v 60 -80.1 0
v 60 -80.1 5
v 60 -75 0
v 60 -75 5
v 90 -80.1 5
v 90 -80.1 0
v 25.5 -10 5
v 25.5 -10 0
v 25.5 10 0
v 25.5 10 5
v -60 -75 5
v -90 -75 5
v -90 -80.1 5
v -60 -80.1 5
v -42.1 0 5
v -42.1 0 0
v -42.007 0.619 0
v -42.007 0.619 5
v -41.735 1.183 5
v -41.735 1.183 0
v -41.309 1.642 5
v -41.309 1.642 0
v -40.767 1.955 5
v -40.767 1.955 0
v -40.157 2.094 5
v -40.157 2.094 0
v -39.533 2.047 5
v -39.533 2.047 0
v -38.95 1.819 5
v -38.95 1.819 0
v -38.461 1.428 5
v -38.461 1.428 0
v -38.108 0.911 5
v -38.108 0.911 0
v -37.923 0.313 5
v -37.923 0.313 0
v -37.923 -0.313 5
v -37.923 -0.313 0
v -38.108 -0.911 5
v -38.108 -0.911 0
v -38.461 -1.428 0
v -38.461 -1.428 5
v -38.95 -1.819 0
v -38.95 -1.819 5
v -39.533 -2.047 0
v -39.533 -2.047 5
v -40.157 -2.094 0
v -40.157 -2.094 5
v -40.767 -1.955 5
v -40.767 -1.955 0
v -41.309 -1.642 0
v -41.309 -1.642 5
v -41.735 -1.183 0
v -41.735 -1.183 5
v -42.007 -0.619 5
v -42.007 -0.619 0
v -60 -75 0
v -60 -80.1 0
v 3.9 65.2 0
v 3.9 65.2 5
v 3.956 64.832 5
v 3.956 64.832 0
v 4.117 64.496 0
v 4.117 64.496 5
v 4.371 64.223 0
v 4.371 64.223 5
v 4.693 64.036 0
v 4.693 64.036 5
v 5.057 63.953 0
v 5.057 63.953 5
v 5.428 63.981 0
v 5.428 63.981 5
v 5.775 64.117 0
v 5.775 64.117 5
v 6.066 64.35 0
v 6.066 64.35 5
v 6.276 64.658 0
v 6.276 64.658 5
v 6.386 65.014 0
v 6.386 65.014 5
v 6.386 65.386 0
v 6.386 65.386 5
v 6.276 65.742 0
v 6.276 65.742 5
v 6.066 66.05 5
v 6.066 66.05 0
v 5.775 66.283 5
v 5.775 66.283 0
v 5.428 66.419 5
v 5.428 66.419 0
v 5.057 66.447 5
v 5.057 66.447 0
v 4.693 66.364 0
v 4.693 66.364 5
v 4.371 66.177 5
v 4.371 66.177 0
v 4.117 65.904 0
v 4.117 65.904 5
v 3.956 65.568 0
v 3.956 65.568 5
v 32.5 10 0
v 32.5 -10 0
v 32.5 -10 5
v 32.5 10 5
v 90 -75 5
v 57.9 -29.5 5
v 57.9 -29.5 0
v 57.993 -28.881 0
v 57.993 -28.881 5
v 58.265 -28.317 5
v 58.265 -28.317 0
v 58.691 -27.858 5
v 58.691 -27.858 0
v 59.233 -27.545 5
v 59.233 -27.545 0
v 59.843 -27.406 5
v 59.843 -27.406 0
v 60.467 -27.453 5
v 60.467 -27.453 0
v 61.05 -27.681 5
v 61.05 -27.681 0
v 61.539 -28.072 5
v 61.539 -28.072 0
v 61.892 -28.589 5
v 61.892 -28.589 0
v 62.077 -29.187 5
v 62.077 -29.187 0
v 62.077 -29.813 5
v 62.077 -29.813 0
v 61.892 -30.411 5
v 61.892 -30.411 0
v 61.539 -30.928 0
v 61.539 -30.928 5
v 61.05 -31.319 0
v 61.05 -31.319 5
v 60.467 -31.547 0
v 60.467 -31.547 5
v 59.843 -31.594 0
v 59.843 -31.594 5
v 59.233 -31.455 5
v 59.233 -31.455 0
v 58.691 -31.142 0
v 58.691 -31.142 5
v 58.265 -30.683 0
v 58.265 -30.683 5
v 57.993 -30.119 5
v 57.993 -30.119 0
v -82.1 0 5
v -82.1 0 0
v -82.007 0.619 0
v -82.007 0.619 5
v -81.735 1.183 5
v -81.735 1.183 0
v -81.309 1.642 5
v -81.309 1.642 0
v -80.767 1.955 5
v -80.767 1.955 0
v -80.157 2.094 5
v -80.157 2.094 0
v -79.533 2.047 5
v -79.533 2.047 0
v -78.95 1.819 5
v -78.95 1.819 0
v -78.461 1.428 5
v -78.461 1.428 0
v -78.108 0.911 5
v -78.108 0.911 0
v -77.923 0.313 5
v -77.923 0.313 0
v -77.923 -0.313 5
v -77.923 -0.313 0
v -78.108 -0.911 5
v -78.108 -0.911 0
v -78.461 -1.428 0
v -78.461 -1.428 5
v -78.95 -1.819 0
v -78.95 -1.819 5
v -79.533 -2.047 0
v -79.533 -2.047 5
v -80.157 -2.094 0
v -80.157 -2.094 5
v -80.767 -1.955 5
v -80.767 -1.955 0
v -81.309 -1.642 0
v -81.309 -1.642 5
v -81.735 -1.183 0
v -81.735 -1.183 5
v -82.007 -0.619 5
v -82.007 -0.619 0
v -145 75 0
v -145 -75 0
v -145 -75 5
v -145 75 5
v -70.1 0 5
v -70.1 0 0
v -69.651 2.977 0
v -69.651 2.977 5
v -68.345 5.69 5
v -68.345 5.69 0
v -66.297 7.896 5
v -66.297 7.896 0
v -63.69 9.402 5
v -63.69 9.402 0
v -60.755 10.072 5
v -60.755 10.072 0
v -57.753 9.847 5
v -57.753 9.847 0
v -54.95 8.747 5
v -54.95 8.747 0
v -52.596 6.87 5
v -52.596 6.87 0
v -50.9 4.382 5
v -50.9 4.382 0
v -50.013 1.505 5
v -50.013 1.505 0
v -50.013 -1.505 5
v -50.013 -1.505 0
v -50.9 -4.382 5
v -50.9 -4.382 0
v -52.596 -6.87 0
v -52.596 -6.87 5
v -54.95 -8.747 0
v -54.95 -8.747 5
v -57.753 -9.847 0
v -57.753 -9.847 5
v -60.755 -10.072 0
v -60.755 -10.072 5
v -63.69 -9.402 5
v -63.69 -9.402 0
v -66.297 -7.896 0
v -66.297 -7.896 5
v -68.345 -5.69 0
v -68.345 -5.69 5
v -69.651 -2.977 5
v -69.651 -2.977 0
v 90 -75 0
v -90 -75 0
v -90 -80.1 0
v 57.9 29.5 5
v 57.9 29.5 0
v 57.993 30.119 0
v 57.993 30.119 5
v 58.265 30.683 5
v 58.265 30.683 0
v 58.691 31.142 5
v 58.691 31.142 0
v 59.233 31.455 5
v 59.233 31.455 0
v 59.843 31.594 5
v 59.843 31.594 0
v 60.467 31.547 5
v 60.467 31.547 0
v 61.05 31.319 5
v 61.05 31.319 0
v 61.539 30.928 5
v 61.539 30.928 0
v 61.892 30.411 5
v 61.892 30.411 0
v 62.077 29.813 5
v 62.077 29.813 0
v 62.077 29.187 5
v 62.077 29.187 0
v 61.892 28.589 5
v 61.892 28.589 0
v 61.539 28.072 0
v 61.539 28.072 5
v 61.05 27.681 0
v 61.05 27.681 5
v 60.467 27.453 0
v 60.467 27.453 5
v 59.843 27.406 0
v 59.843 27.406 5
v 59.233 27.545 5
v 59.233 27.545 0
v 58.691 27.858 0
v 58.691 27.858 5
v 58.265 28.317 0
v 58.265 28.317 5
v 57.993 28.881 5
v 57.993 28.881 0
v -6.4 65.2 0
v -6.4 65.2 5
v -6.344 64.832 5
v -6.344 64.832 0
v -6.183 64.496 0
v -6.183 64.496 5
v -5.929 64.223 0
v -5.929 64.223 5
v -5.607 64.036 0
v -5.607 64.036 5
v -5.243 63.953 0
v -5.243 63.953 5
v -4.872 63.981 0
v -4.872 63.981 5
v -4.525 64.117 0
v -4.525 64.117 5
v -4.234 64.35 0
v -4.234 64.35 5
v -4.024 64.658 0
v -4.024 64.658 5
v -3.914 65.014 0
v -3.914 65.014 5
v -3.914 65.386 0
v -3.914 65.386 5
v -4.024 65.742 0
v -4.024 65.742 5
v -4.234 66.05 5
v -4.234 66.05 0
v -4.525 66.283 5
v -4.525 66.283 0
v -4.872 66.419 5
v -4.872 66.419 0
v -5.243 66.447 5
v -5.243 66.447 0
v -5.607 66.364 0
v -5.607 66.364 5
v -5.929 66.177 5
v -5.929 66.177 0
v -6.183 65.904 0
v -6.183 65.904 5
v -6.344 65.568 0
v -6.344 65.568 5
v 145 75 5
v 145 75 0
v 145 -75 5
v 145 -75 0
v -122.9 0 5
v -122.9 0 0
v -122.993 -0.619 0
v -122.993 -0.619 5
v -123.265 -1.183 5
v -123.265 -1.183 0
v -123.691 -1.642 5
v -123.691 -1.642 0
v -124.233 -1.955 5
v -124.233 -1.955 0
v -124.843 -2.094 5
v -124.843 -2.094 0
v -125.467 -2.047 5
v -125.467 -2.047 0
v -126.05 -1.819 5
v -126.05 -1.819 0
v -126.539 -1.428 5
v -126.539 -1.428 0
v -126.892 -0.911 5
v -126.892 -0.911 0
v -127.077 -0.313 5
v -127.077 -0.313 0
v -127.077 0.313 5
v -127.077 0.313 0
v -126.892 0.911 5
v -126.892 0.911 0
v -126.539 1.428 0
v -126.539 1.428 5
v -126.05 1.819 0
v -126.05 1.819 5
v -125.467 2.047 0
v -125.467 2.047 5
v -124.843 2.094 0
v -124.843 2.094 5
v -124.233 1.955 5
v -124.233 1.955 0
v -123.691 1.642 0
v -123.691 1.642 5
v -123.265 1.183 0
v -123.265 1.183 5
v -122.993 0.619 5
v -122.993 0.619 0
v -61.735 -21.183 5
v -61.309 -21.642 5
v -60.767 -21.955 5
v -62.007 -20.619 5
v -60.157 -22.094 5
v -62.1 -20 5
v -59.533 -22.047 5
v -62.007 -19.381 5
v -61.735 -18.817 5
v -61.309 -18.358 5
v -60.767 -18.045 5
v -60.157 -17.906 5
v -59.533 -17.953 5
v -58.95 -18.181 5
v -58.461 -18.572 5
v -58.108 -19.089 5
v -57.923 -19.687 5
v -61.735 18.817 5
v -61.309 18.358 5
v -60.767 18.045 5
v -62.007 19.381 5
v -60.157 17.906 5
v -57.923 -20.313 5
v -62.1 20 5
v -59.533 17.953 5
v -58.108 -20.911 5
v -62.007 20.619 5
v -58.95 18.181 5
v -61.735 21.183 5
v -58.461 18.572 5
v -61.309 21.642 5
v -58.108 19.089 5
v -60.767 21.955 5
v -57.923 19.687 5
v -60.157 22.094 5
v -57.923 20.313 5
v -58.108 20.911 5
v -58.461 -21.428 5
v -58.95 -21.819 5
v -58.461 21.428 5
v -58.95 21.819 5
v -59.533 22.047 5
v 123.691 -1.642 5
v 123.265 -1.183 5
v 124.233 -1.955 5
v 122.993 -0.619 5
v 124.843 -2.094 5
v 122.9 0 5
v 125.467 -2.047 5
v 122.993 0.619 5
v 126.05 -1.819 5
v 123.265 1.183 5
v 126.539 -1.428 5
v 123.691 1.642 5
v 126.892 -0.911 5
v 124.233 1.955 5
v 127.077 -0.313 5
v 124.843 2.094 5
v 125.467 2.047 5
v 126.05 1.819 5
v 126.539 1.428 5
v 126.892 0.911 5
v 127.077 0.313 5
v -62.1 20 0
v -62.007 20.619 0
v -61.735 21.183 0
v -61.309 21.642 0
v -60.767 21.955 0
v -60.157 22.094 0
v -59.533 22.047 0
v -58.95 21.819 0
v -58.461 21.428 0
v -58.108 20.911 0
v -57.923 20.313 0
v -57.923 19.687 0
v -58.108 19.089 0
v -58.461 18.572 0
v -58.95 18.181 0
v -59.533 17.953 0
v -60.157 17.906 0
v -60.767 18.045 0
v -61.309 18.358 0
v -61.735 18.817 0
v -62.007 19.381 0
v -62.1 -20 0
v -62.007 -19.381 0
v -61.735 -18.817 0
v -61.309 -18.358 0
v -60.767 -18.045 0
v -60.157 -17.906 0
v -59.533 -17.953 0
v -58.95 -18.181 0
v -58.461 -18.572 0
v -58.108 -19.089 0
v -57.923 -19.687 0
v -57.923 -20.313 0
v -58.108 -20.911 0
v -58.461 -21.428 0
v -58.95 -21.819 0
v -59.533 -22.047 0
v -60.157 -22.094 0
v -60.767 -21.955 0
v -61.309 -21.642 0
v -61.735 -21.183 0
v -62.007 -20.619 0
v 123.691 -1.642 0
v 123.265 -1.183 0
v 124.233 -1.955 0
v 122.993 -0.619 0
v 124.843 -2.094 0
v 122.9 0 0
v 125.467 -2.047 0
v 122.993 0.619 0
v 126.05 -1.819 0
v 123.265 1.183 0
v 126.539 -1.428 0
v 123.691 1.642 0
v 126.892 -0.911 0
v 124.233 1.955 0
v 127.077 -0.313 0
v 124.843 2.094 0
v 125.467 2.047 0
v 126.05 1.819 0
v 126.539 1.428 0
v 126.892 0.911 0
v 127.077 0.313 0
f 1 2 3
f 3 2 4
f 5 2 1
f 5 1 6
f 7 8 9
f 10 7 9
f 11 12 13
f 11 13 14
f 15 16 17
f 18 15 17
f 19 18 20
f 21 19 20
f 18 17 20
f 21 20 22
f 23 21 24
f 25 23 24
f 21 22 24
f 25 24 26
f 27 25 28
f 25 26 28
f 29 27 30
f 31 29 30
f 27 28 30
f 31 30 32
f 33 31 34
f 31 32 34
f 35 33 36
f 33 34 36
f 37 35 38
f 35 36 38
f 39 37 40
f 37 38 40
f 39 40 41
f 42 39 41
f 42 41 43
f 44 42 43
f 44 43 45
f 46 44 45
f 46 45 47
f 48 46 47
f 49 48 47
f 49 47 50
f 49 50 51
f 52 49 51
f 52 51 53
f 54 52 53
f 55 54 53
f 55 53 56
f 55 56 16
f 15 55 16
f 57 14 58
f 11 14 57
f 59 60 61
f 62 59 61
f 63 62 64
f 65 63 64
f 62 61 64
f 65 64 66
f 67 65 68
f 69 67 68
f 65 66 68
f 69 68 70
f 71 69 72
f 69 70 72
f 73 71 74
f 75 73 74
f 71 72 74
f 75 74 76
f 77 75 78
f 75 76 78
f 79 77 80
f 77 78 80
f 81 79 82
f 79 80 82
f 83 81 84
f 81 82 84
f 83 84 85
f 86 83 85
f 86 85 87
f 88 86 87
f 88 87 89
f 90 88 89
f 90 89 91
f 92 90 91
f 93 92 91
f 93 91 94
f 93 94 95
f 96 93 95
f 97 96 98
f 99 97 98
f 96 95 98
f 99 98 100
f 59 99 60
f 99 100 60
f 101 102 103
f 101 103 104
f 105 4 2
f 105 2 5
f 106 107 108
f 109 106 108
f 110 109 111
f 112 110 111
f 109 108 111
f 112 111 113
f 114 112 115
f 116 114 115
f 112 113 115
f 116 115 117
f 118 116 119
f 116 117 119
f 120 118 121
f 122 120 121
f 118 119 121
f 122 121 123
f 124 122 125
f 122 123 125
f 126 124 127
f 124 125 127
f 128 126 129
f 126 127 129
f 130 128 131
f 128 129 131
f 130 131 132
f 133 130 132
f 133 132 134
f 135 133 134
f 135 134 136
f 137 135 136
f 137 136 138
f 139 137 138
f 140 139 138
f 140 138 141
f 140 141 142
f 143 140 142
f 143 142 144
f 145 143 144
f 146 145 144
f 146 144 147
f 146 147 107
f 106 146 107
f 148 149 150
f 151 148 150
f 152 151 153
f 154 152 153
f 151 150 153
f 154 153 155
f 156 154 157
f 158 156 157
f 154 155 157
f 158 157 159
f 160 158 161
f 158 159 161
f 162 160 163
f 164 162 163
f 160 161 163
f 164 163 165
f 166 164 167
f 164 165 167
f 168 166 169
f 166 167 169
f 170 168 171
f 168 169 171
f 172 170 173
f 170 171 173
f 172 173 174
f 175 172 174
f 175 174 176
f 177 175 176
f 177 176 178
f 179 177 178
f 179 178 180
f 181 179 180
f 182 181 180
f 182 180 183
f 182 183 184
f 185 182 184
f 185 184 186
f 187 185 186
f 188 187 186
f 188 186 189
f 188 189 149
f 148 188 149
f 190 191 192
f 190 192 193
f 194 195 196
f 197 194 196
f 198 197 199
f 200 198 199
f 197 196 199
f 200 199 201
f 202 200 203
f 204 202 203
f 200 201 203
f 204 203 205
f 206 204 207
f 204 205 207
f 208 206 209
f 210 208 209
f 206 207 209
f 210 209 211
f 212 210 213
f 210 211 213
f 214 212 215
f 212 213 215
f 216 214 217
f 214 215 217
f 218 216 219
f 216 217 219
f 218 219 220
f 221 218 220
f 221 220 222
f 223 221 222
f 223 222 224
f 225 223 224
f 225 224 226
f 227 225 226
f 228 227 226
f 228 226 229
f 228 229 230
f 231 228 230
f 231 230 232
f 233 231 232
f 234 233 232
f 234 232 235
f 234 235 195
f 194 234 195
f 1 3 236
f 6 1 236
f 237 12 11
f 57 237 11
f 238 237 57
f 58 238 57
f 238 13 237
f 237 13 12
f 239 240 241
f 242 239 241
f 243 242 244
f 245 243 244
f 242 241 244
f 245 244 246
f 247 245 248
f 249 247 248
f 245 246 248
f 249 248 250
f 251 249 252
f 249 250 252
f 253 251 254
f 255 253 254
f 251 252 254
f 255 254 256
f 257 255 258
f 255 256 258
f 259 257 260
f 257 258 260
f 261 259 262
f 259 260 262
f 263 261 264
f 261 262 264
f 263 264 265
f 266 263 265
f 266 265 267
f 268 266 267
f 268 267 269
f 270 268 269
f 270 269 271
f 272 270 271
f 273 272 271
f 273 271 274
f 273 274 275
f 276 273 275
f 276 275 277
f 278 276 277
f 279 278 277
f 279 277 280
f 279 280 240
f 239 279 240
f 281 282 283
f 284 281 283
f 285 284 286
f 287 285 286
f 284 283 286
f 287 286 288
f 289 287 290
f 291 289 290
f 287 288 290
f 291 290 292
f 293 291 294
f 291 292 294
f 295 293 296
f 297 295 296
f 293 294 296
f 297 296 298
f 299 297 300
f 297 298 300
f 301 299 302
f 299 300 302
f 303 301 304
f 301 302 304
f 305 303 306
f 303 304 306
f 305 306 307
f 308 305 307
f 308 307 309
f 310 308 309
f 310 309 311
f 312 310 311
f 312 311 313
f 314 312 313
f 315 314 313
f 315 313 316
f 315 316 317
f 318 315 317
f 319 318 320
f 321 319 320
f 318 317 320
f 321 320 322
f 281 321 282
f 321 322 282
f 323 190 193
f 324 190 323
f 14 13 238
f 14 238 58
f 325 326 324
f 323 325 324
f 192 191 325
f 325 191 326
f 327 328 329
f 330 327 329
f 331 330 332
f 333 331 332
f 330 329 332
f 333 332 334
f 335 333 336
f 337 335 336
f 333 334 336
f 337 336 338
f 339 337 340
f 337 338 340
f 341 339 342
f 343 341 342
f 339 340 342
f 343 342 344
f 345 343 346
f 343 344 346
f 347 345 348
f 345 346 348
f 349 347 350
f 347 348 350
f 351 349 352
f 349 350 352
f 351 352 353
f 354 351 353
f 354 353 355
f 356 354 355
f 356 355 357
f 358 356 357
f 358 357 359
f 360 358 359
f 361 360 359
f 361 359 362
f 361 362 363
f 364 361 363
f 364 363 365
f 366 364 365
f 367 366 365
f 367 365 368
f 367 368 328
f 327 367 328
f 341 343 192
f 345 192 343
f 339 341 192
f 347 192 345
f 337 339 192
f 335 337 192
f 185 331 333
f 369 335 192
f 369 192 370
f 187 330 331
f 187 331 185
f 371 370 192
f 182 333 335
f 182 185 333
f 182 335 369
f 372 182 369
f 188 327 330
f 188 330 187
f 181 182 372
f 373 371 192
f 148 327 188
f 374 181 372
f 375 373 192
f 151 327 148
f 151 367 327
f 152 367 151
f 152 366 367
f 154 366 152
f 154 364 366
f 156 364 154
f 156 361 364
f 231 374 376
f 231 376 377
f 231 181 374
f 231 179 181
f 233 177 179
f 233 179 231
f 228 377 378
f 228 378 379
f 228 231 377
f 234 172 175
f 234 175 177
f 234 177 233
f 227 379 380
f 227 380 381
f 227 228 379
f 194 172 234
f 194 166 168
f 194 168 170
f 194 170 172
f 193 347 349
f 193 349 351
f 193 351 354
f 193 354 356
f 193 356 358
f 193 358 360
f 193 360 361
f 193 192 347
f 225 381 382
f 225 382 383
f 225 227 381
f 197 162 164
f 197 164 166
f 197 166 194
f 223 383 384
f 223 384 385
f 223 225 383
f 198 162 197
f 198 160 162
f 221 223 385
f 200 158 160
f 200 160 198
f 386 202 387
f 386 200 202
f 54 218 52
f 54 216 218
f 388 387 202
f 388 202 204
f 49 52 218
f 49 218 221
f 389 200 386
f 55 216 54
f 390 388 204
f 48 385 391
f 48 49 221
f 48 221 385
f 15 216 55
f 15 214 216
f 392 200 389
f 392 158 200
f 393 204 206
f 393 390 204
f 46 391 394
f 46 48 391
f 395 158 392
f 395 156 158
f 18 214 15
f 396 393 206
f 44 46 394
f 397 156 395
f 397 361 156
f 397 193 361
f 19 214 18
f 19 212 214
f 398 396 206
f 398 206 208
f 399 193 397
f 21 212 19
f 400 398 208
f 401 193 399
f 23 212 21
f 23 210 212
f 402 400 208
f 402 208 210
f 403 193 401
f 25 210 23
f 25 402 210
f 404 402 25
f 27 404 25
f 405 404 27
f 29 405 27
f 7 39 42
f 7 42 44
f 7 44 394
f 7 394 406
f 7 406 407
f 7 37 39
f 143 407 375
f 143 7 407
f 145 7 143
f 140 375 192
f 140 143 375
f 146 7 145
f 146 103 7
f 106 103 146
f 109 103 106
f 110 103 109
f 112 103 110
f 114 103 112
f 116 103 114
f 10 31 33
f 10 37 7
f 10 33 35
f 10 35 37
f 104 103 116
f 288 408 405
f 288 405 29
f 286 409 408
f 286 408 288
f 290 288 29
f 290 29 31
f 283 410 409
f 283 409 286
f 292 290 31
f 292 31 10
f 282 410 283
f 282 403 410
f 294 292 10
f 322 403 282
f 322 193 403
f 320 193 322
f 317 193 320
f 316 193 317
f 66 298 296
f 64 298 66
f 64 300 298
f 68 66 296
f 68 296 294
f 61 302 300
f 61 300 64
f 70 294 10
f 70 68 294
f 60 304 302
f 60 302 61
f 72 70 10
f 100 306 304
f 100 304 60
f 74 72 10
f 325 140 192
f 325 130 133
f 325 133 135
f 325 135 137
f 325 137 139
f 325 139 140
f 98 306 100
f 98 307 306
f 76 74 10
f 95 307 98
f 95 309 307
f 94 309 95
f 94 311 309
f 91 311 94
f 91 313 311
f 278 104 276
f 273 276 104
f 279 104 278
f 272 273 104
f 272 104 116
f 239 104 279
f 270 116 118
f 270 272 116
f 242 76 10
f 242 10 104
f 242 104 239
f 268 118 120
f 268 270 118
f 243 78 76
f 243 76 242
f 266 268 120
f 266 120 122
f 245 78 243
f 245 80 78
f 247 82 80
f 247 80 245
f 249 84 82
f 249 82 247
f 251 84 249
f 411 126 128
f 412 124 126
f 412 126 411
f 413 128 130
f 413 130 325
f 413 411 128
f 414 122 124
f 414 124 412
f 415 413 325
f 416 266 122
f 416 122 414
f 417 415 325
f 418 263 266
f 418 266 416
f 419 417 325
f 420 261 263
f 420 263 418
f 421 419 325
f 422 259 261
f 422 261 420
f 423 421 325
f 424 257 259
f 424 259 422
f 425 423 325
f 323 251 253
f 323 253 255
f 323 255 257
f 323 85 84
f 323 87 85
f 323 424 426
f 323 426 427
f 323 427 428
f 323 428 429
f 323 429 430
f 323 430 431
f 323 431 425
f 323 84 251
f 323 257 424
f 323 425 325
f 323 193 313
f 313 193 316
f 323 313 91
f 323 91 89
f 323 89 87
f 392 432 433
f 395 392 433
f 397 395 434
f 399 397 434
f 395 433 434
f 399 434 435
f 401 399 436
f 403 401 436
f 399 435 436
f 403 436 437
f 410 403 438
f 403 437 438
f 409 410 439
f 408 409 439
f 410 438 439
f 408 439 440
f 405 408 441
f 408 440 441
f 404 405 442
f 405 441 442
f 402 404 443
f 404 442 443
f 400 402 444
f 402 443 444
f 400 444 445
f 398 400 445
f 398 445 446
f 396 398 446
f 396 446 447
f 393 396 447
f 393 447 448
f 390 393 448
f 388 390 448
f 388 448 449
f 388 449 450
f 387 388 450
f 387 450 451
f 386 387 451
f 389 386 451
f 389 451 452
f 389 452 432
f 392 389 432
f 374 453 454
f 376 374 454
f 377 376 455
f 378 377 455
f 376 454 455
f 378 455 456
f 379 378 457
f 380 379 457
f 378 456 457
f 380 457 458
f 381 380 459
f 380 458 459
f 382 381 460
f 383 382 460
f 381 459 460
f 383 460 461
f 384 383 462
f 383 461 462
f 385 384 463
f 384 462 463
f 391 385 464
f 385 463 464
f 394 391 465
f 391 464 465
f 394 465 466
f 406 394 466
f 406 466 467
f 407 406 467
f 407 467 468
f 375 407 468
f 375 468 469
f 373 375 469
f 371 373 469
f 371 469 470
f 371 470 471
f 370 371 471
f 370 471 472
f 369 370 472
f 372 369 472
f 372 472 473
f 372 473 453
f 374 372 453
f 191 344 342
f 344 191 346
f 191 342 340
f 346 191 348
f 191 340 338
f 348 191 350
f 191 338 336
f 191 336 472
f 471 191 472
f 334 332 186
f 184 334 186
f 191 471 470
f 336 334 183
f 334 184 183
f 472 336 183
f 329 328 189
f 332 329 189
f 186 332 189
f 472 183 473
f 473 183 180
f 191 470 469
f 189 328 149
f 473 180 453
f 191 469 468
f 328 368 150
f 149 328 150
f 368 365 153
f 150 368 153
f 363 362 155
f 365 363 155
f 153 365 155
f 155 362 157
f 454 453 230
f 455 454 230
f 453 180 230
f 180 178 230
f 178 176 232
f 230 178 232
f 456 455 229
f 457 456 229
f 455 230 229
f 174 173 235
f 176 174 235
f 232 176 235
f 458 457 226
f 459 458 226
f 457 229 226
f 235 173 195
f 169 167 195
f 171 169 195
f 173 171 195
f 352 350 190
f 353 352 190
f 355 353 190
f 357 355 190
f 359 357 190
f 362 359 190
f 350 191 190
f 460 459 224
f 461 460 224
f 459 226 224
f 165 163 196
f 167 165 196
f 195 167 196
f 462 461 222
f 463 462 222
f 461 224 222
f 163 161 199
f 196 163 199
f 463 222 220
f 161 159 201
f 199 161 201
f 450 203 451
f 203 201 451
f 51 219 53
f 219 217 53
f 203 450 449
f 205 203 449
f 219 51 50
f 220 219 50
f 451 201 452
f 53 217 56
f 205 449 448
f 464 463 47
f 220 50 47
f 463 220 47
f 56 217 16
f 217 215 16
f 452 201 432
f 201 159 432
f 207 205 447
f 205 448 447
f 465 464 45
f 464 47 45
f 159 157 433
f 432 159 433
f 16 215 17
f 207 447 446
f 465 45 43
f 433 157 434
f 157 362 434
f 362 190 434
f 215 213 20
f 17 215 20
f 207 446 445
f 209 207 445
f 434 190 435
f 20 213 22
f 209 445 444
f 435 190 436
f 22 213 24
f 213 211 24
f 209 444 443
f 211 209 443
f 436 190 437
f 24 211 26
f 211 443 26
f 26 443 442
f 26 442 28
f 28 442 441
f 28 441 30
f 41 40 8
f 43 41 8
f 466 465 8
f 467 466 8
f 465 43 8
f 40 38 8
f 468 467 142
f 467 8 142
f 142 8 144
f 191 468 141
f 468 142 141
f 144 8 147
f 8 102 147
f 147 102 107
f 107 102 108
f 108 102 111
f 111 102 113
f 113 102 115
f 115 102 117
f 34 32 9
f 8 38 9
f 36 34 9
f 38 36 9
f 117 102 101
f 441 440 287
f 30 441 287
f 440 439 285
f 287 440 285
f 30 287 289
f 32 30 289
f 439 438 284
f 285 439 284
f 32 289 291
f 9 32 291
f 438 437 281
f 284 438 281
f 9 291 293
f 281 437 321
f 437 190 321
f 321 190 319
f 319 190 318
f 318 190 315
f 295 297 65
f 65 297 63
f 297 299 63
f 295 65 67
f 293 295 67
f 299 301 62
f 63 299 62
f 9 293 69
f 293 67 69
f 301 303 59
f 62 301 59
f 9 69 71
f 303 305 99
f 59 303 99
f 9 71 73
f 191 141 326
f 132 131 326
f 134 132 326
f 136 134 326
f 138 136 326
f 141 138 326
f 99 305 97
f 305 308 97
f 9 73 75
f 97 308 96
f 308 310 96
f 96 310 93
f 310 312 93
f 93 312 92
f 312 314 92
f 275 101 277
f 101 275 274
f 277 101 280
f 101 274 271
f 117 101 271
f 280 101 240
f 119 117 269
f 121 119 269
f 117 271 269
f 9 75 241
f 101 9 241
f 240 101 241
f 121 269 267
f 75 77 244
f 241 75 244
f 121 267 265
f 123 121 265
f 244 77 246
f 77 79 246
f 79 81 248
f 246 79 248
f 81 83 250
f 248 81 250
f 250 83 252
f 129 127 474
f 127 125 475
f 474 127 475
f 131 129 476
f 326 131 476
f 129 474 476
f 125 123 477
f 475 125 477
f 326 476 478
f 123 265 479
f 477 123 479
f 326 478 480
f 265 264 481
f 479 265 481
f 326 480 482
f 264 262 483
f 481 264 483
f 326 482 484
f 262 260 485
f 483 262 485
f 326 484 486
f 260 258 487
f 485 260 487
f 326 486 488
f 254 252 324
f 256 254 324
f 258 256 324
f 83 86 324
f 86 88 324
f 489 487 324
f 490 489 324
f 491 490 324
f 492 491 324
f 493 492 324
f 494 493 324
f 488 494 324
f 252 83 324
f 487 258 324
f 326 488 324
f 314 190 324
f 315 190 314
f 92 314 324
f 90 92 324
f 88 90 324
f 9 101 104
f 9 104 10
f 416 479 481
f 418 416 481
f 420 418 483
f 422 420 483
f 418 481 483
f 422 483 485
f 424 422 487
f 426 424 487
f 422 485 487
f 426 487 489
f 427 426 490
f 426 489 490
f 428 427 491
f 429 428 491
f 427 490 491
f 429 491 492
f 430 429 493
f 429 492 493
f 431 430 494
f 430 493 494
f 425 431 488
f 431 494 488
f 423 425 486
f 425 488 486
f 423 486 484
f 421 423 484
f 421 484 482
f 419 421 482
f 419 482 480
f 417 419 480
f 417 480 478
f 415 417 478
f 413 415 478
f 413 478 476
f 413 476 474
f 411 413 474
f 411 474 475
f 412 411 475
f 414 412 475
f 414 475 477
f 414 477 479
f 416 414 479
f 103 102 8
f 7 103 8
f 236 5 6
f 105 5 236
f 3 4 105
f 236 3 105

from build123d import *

# Parameters (mm, degrees)
SKETCH1_W             = 290
SKETCH1_H             = 150
BOSS_EXTRUDE1_DEPTH   = 5
CUT_EXTRUDE1_DEPTH    = 5
SKETCH3_W             = 30
SKETCH3_H             = 5.1
BOSS_EXTRUDE2_DEPTH   = 5
BOSS_EXTRUDE2_2_DEPTH = 5
SKETCH4_R             = 2.1
CUT_EXTRUDE2_DEPTH    = 10
SKETCH5_R             = 10.1
CUT_EXTRUDE3_DEPTH    = 10
SKETCH6_R             = 2.1
CUT_EXTRUDE4_DEPTH    = 10
SKETCH7_R             = 2.1
CUT_EXTRUDE5_DEPTH    = 10
SKETCH8_W             = 7
SKETCH8_H             = 20
CUT_EXTRUDE6_DEPTH    = 10


with BuildPart() as part:
    # Sketch1 → Boss-Extrude1 (new body)
    with BuildSketch(Plane.XY):
        Rectangle(SKETCH1_W, SKETCH1_H)
    extrude(amount=BOSS_EXTRUDE1_DEPTH)

    # Sketch2 → Cut-Extrude1 (cut)
    with BuildSketch(Plane.XY.offset(5)):
        with BuildLine():
            Line((-6.4, 65.2), (-5.15, 65.2))
            Line((-5.15, 65.2), (-3.9, 65.2))
            ThreePointArc((-3.9, 65.2), (-5.15, 66.45), (-6.4, 65.2))
        make_face()
        with BuildLine():
            Line((-3.9, 65.2), (-5.15, 65.2))
            Line((-5.15, 65.2), (-6.4, 65.2))
            ThreePointArc((-6.4, 65.2), (-5.15, 63.95), (-3.9, 65.2))
        make_face()
        with BuildLine():
            ThreePointArc((6.4, 65.2), (5.15, 66.45), (3.9, 65.2))
            Line((3.9, 65.2), (5.15, 65.2))
            Line((5.15, 65.2), (6.4, 65.2))
        make_face()
        with BuildLine():
            Line((5.15, 65.2), (3.9, 65.2))
            ThreePointArc((3.9, 65.2), (5.15, 63.95), (6.4, 65.2))
            Line((6.4, 65.2), (5.15, 65.2))
        make_face()
    extrude(amount=-CUT_EXTRUDE1_DEPTH, mode=Mode.SUBTRACT)

    # Sketch4 → Cut-Extrude2 (cut)
    with BuildSketch(Plane(origin=(0, 0, 0), x_dir=(-1, 0, 0), z_dir=(0, 0, -1))):
        with Locations((-125, 0)):
            Circle(SKETCH4_R)
        with Locations(Location((125, 0, 0), (0, 0, 180))):
            Circle(SKETCH4_R)
    extrude(amount=-CUT_EXTRUDE2_DEPTH, mode=Mode.SUBTRACT)

    # Sketch5 → Cut-Extrude3 (cut)
    with BuildSketch(Plane(origin=(0, 0, 0), x_dir=(-1, 0, 0), z_dir=(0, 0, -1))):
        with Locations((60, 0)):
            Circle(SKETCH5_R)
    extrude(amount=-CUT_EXTRUDE3_DEPTH, mode=Mode.SUBTRACT)

    # Sketch6 → Cut-Extrude4 (cut)
    with BuildSketch(Plane(origin=(0, 0, 0), x_dir=(-1, 0, 0), z_dir=(0, 0, -1))):
        with Locations((-60, 29.5)):
            Circle(SKETCH6_R)
        with Locations((-60, -29.5)):
            Circle(SKETCH6_R)
    extrude(amount=-CUT_EXTRUDE4_DEPTH, mode=Mode.SUBTRACT)

    # Sketch7 → Cut-Extrude5 (cut)
    with BuildSketch(Plane(origin=(0, 0, 0), x_dir=(-1, 0, 0), z_dir=(0, 0, -1))):
        with Locations((60, 20)):
            Circle(SKETCH7_R)
        with Locations((80, 0)):
            Circle(SKETCH7_R)
        with Locations((60, -20)):
            Circle(SKETCH7_R)
        with Locations((40, 0)):
            Circle(SKETCH7_R)
    extrude(amount=-CUT_EXTRUDE5_DEPTH, mode=Mode.SUBTRACT)

    # Sketch8 → Cut-Extrude6 (cut)
    with BuildSketch(Plane(origin=(0, 0, 0), x_dir=(-1, 0, 0), z_dir=(0, 0, -1))):
        with Locations((-29, 0)):
            Rectangle(SKETCH8_W, SKETCH8_H)
    extrude(amount=-CUT_EXTRUDE6_DEPTH, mode=Mode.SUBTRACT)


with BuildPart() as body_2:
    # Sketch3 → Boss-Extrude2 (new body)
    with BuildSketch(Plane.XY.offset(5)):
        with Locations((-75, -77.55)):
            Rectangle(SKETCH3_W, SKETCH3_H)
    extrude(amount=-BOSS_EXTRUDE2_DEPTH)


with BuildPart() as body_3:
    # Sketch3 → Boss-Extrude2 2 (new body)
    with BuildSketch(Plane.XY.offset(5)):
        with Locations((75, -77.55)):
            Rectangle(SKETCH3_W, SKETCH3_H)
    extrude(amount=-BOSS_EXTRUDE2_2_DEPTH)


solid = Compound([part.part, body_2.part, body_3.part])
